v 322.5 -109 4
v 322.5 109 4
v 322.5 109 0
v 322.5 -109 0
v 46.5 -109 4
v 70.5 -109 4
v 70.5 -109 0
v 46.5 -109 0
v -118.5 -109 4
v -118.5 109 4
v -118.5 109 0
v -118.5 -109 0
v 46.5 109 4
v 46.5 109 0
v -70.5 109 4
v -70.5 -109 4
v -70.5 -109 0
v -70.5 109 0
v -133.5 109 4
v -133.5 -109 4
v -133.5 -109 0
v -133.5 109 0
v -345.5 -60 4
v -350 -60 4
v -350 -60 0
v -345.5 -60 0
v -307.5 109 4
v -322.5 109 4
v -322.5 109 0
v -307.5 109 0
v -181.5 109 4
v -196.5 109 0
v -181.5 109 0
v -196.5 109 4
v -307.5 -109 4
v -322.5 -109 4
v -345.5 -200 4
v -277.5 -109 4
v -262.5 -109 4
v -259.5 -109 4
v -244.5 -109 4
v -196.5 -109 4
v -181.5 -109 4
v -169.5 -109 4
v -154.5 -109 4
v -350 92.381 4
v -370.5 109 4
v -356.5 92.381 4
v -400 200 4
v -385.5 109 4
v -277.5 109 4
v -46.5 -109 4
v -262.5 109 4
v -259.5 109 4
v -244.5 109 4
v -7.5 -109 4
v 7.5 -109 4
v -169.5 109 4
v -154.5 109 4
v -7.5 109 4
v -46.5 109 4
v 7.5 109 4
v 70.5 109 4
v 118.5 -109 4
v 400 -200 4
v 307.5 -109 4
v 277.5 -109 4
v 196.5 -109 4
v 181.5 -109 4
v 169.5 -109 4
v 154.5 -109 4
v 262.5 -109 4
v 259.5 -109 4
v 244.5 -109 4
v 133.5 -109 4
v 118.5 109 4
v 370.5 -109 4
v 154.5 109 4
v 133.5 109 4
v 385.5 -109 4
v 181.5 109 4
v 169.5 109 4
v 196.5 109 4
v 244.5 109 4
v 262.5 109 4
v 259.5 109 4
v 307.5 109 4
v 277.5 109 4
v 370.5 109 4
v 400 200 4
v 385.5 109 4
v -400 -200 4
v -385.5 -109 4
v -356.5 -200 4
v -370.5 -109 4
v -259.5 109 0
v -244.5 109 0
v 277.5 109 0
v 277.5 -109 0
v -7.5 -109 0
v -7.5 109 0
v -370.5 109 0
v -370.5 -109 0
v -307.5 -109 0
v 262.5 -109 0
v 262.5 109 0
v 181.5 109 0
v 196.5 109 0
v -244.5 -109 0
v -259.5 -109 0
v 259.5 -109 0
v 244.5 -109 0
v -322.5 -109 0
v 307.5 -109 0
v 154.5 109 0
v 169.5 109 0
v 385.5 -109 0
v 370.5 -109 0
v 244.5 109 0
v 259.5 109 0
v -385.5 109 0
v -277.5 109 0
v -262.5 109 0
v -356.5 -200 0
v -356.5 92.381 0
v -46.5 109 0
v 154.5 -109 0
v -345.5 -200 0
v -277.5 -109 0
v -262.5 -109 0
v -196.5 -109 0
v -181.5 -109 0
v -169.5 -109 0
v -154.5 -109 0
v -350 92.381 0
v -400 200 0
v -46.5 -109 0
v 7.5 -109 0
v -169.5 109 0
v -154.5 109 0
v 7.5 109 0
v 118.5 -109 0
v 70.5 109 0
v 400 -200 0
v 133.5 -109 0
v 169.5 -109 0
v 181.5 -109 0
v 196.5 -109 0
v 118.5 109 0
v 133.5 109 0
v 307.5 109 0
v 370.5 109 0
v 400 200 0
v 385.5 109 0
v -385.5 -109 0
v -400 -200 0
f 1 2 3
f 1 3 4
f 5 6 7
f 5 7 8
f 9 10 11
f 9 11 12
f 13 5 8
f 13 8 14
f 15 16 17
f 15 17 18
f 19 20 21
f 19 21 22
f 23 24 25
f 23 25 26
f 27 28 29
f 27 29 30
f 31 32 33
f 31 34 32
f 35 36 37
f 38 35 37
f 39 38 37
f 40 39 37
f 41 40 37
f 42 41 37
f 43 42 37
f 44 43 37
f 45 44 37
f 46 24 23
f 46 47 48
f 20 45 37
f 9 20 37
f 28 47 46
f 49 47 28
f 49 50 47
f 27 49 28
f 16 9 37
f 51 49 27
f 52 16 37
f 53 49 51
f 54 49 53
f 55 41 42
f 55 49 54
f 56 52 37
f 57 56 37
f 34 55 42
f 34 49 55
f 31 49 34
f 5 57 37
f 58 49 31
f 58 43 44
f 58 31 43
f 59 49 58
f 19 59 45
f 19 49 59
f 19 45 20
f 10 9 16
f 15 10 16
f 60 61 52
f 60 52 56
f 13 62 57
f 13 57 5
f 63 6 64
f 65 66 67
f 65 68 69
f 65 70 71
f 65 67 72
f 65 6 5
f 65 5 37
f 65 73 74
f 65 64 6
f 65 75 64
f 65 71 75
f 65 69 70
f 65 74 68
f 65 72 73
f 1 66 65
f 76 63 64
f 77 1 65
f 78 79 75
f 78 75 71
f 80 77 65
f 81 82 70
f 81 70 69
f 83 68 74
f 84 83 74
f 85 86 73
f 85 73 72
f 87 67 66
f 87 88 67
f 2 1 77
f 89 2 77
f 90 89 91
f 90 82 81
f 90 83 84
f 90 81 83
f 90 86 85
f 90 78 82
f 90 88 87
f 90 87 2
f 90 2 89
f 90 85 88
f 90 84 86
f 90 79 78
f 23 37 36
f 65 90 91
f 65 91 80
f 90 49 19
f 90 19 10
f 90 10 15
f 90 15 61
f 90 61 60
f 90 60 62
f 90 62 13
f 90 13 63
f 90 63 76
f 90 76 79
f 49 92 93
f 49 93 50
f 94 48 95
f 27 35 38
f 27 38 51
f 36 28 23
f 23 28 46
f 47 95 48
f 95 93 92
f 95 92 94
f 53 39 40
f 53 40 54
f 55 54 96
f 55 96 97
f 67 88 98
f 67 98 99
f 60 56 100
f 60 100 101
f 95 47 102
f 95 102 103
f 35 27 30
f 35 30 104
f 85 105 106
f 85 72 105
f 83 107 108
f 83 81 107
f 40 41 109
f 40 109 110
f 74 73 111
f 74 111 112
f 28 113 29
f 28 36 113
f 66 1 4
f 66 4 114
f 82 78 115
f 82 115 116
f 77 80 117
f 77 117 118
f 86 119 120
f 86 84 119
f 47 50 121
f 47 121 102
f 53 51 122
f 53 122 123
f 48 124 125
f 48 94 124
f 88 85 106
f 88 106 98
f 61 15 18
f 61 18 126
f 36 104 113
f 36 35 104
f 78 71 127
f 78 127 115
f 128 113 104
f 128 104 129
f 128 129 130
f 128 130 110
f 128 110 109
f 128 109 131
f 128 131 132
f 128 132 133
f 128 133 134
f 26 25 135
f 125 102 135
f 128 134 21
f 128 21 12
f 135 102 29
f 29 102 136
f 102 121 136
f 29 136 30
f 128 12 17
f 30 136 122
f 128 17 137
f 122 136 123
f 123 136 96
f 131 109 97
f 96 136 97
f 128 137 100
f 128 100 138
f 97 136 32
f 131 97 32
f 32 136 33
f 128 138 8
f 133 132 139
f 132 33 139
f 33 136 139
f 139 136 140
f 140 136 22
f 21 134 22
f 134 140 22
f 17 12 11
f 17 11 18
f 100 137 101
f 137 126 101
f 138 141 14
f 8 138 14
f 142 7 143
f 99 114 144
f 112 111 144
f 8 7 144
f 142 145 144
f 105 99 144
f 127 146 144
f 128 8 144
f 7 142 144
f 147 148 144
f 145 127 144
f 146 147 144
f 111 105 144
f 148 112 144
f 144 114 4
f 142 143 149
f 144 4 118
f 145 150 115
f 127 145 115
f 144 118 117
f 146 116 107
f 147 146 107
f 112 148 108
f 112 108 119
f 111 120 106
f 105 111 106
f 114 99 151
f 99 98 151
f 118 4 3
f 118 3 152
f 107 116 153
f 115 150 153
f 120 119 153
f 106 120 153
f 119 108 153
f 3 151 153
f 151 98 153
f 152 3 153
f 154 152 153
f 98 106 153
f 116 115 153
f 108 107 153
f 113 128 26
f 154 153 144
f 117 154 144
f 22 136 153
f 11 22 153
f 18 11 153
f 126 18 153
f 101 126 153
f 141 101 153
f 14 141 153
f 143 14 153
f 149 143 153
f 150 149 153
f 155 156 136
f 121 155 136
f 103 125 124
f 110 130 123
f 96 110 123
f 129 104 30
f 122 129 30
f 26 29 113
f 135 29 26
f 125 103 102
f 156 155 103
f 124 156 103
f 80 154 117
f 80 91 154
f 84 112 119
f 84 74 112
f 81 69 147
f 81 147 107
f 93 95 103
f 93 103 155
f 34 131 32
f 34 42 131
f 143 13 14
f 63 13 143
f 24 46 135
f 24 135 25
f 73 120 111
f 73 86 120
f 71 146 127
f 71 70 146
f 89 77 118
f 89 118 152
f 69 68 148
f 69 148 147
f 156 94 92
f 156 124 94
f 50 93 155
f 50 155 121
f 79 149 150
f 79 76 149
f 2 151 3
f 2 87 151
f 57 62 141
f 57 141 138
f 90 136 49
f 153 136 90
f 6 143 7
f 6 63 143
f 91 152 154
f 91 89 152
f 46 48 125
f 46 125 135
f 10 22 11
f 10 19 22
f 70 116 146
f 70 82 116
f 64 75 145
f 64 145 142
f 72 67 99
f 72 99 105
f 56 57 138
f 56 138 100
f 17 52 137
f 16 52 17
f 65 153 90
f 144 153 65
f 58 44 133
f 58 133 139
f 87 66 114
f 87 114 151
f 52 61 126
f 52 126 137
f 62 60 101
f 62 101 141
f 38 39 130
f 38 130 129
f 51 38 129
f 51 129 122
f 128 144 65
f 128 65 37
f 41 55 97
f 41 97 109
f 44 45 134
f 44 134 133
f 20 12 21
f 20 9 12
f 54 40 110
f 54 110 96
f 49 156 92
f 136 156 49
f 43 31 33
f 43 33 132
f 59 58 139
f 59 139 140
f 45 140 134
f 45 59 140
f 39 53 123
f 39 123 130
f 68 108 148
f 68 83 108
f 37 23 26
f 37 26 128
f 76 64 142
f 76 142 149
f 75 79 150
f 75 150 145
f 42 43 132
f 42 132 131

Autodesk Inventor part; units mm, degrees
ref_plane "YZ Plane" through (0, 0, 0) normal (1, 0, 0) x (0, 1, 0)
ref_plane "XZ Plane" through (0, 0, 0) normal (0, 1, 0) x (-1, 0, 0)
sketch "ferrite_layer_outline_sketch" plane through (0, 0, 0) normal (0, 0, 1) x (1, 0, 0)
  line L0 (-400, 200) -> (400, 200)
  line L1 (400, 200) -> (400, -200)
  line L2 (400, -200) -> (-400, -200)
  line L3 (-400, -200) -> (-400, 200)
  line L4 (0, 200) -> (0, -200) construction
  line L5 (0, 136.1953) -> (0, -273.5408) construction
  line L6 (0, 200) -> (0, -200)
  point P0 (0, 0)
  point P1 (0, 0)
  point P2 (0, 0)
  dimension "d85" = 800
  dimension "d86" = 400
extrude "Sheet Extrude" add sketch "ferrite_layer_outline_sketch" along normal blind 4
ref_plane "acrylic_sheet_plane" through (0, 0, 4) normal (0, 0, 1) x (1, 0, 0)
sketch "Sketch4" plane through (0, 0, 4) normal (0, 0, 1) x (1, 0, 0)
  line L0 (-385.5, 109) -> (-370.5, 109)
  line L1 (-370.5, 109) -> (-370.5, -109)
  line L2 (-370.5, -109) -> (-385.5, -109)
  line L3 (-385.5, -109) -> (-385.5, 109)
  line L4 (-12.6534, 0) -> (47.471, 0)
  line L5 (-400, 200) -> (-400, -200) projected
  line L6 (400, 200) -> (-400, 200) projected
  line L7 (-400, -200) -> (400, -200) projected
  point P0 (0, 0)
  point P1 (-385.5, 0)
  point P2 (-400, 0)
  dimension "d43" = 15
  dimension "d44" = 218
  dimension "d45" = 14.5
extrude "Extrusion9" cut sketch "Sketch4" against normal through all
pattern_linear "Rectangular Pattern 7 fer" count 7 spacing 126 along (1, 0, 0) of "Extrusion9"
pattern_linear "Rectangular Pattern 8 fer" count 8 spacing 108 along (1, 0, 0) of "Extrusion9"
pattern_linear "pattern_test_#_of_ferrites 9 fer" [suppressed]
pattern_linear "Rectangular Pattern 10 fer" [suppressed]
pattern_linear "Rectangular Pattern 13" count 13 spacing 63 along (1, 0, 0) of "Extrusion9"
sketch "dimension_layout_sketch" plane through (0, 0, 4) normal (0, 0, 1) x (1, 0, 0)
  line L0 (-400, 200) -> (-400, -200) projected
  line L1 (400, -200) -> (400, 200) projected
  line L2 (400, 200) -> (-400, 200) projected
  line L3 (-400, -200) -> (400, -200) projected
  line L4 (-400, 150) -> (400, 150)
  line L5 (400, 150) -> (400, -150)
  line L6 (400, -150) -> (-400, -150)
  line L7 (-400, -150) -> (-400, 150)
  line L8 (0, 150) -> (0, -150) construction
  line L9 (-400, 200) -> (-400, -200) construction
  circle A0 centre (-359.2579, 182.7315) radius 4
  point P0 (0, 0)
  dimension "d87" = 300
  dimension "d88" = 8
sketch "wire_guide_layout_sketch" plane through (0, 0, 4) normal (0, 0, 1) x (1, 0, 0)
  line L0 (-400, -200) -> (400, -200) projected
  line L1 (-356.5, 92.3814) -> (-350, 92.3814)
  line L2 (-350, 92.3814) -> (-350, -200)
  line L3 (-350, -200) -> (-356.5, -200)
  line L4 (-356.5, -200) -> (-356.5, 92.3814)
  line L5 (-400, 200) -> (-400, -200) projected
  line L6 (-385.5, 109) -> (-370.5, 109) projected
  line L7 (-350, -60) -> (-345.5, -60)
  line L8 (-345.5, -60) -> (-345.5, -200)
  line L9 (-345.5, -200) -> (-350, -200)
  point P0 (0, 0)
  dimension "d89" = 43.5
  dimension "d90" = 6.5
  dimension "d91" = 140
  dimension "d92" = 4.5
extrude "wire_guide Cut" cut sketch "wire_guide_layout_sketch" against normal through all
equation "\"d85\" = track_length"
equation "\"d86\" = layer_width"
equation "\"d43\" = ferrite_width"
equation "\"d44\" = ferrite_length"
equation "\"d45\" = edge_gap_distance"
equation "\"d50\" = parameter_5"
equation "\"d62\" = test_parameter_5"
equation "\"d87\" = track_width"
equation "\"d88\" = bolt_diameter"
equation "\"track_length\" = 800"
equation "\"track_width\" = 300"
equation "\"edge_gap_distance\" = 14.5"
equation "\"ferrite_length\" = 218"
equation "\"ferrite_width\" = 15"
equation "\"number_of_ferrites\" = 7"
equation "\"acrylic_sheet_8mm\" = 8"
equation "\"layer_width\" = 400"
equation "\"bolt_diameter\" = 8"
equation "\"layer_length\" = 800"
equation "\"real_sheet_width\" = 500"
equation "\"ferrite_height\" = 8"
equation "\"parameter_2\" = 30"
equation "\"parameter_6\" = 120"
equation "\"number_of_bolts\" = 5"
equation "\"x_offset_for_bolts\" = 75"
equation "\"y_offset_for_bolts\" = 175"
equation "\"wire_diameter\" = 4.5"
equation "\"distance_between_wires\" = -1.2 * wire_diameter + 0.2 * parameter_6"
equation "\"distance_between_wires_edge\" = -1.5 * wire_diameter + 0.5 * parameter_2"
equation "\"bend_radius_inner\" = 15"
equation "\"wall_length\" = track_length"
equation "\"wall_width\" = -0.5 * track_width + 0.5 * layer_width"
equation "\"wall_thickness\" = 25"
equation "\"parameter_5\" = 126"
equation "\"test_parameter_5\" = 94.5"
properties part number "ferrite_layer_dex_1R1"
